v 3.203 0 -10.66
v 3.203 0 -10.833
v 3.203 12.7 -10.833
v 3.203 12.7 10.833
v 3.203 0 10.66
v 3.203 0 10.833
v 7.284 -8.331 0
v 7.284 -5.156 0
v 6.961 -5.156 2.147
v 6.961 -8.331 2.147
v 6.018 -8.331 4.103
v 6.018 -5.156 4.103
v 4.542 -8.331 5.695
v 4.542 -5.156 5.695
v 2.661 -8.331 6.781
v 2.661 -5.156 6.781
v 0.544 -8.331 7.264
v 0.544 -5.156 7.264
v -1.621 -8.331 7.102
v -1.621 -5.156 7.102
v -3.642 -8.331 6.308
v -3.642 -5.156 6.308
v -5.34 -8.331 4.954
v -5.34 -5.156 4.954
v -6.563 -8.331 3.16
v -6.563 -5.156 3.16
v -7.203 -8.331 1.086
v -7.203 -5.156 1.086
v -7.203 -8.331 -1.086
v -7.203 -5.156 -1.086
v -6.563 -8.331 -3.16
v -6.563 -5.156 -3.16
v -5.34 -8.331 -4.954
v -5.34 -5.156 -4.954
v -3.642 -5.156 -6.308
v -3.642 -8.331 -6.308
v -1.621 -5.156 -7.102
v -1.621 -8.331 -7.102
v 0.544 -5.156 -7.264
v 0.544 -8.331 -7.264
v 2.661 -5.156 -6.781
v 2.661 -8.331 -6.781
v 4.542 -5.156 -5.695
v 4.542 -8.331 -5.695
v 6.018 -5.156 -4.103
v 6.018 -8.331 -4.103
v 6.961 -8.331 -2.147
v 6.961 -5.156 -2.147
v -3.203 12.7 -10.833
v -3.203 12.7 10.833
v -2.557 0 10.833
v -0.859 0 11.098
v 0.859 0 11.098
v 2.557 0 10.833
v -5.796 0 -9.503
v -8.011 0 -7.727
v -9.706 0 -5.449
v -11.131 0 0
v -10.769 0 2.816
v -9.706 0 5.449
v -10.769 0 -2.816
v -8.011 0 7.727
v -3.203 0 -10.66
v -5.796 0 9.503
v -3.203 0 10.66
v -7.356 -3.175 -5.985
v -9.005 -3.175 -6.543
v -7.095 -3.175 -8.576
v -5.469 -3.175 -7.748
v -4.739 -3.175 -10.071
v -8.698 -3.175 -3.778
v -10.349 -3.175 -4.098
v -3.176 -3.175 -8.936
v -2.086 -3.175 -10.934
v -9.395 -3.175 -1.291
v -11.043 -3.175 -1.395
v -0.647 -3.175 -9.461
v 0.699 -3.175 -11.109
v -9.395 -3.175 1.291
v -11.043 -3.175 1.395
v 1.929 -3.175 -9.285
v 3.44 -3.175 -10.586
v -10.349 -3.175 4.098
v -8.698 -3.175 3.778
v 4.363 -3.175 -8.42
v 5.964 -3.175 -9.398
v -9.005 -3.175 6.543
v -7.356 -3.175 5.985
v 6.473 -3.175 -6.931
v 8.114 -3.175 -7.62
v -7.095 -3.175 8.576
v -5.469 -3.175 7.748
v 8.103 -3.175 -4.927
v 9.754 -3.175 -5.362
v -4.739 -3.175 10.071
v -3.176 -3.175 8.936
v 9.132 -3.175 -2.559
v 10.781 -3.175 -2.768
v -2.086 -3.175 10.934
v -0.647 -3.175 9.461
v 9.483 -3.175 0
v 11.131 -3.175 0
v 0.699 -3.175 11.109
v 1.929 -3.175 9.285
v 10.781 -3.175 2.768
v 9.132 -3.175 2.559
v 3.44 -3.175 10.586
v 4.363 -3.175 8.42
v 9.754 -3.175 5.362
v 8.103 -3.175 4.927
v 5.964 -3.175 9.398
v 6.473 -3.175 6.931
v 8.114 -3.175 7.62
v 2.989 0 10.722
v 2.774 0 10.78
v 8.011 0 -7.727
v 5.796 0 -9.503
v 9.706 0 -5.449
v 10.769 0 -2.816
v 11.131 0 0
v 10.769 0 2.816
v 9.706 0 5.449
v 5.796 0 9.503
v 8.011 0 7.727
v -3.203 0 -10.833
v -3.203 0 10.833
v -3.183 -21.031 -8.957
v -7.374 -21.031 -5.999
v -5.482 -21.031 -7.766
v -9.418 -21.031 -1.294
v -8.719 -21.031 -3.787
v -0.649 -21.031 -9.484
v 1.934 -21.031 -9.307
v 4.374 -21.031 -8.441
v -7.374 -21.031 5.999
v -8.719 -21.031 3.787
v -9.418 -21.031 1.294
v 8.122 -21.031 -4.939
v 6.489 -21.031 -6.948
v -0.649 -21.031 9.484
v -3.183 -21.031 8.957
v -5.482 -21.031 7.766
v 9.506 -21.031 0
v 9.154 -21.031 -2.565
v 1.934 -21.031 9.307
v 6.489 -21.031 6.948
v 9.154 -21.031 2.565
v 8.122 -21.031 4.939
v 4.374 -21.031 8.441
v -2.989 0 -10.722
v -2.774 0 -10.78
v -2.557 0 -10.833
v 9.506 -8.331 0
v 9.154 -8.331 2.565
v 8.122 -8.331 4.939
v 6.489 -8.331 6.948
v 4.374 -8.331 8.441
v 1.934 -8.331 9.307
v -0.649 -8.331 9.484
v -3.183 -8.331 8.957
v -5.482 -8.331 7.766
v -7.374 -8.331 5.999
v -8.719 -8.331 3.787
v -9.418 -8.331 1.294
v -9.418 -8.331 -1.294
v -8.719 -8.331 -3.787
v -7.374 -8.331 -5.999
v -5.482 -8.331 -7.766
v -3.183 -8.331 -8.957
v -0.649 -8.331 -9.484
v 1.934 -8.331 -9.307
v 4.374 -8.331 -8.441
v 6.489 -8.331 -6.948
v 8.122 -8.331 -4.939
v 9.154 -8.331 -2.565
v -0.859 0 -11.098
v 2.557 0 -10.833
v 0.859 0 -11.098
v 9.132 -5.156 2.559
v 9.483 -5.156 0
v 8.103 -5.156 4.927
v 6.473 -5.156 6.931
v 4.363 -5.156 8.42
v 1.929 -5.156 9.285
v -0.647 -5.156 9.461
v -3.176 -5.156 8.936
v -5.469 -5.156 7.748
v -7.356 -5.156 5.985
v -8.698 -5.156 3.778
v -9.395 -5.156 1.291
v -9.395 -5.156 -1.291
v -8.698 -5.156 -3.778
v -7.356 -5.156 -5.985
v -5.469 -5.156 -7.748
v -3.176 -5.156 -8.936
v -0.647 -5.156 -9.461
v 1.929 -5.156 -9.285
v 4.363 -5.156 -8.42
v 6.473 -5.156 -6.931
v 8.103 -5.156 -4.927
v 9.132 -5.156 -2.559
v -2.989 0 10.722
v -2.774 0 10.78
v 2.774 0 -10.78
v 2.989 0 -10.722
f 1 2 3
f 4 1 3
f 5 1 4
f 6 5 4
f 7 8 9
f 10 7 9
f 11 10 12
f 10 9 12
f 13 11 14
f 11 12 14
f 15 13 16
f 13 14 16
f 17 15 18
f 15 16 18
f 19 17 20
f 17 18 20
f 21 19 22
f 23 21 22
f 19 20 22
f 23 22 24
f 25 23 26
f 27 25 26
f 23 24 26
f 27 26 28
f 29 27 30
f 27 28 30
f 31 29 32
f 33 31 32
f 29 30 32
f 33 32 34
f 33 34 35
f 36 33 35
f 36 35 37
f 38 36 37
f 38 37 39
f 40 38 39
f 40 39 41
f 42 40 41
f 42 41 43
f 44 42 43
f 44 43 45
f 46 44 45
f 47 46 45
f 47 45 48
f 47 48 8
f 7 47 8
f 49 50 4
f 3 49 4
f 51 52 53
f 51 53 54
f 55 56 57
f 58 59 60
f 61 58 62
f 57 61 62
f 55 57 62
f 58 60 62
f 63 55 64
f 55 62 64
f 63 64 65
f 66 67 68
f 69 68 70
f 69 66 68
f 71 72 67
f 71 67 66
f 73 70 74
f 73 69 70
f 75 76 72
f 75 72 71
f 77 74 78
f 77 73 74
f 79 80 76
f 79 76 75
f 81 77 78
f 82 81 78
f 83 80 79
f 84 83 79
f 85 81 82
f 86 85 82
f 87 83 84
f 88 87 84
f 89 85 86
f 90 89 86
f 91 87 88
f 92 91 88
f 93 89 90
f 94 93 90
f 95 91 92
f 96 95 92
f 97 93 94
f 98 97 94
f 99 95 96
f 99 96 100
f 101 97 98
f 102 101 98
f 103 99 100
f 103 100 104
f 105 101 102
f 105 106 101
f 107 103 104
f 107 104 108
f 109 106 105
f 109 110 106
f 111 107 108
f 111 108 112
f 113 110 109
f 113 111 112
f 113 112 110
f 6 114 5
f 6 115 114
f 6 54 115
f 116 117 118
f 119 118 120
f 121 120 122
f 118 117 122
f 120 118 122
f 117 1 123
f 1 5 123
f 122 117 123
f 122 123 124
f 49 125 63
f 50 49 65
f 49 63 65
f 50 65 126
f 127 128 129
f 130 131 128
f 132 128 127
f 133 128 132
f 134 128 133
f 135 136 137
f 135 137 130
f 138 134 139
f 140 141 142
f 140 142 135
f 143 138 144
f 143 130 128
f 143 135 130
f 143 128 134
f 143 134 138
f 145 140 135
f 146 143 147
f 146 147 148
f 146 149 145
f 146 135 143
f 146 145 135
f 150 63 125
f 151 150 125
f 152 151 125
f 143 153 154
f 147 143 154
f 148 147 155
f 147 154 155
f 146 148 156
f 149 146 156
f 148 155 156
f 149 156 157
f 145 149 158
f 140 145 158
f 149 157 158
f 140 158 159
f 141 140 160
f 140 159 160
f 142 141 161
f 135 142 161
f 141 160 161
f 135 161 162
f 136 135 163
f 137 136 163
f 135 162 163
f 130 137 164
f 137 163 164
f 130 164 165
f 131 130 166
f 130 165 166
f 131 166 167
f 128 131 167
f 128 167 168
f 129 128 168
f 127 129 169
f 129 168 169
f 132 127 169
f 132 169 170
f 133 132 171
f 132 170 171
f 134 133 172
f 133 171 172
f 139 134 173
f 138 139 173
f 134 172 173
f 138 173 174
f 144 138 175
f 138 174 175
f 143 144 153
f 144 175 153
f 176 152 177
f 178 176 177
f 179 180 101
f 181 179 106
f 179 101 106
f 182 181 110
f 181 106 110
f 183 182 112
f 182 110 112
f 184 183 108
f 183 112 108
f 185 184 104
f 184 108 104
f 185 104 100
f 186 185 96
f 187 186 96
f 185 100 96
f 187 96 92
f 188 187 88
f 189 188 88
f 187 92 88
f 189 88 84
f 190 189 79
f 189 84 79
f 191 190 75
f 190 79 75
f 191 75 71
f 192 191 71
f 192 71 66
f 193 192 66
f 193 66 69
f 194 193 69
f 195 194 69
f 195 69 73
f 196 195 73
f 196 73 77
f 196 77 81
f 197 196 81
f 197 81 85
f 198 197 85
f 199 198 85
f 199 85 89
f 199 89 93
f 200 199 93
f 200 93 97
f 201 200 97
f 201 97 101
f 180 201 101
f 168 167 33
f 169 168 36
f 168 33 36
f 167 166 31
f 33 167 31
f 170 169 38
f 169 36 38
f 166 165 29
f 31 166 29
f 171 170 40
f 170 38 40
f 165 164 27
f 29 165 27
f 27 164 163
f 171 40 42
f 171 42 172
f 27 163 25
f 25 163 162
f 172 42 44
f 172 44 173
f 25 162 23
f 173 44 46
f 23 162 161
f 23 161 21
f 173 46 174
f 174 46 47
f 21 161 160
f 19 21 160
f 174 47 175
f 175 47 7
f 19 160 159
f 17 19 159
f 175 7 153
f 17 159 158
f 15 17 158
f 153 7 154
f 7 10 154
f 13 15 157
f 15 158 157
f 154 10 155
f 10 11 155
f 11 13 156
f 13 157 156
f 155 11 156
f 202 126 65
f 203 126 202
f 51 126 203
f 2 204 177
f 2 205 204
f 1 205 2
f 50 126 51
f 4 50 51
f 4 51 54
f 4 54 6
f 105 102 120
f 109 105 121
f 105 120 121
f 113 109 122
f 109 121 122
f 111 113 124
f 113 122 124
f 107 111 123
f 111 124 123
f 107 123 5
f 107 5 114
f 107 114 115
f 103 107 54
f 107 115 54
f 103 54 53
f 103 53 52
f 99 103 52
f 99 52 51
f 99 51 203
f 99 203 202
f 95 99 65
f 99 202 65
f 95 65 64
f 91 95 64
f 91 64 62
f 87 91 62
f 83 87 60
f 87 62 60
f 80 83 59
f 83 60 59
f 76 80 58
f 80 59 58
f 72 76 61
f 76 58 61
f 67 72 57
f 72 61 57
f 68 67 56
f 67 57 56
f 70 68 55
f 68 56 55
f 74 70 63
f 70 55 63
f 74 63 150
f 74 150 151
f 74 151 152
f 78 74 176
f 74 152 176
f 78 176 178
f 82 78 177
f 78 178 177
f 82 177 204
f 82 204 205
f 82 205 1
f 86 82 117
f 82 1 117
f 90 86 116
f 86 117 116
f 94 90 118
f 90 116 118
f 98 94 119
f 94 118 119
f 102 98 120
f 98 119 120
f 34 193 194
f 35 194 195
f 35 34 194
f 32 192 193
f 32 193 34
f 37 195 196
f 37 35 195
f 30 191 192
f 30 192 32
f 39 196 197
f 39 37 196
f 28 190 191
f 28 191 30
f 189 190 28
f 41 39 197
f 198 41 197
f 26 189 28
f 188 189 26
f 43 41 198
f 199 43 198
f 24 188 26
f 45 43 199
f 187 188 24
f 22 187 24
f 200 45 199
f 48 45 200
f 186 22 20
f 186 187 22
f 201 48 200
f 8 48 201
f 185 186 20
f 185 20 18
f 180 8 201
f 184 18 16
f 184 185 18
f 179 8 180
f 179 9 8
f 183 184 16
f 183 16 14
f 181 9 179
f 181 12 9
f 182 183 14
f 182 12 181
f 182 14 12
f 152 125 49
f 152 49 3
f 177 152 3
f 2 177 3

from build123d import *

# Parameters (mm, degrees)
F0_R     = 11.130797
F1_DEPTH = 3.175
F2_W     = 6.405964
F2_H     = 21.666086
F3_DEPTH = 12.7
F4_R     = 9.48328
F5_DEPTH = 5.1562
F6_R     = 7.284162
F7_DEPTH = 8.3312
F8_R     = 9.506324
F9_DEPTH = 12.7


with BuildPart() as f1:
    # F0 (on Front) → F1 (new body)
    with BuildSketch(Plane.XZ):
        Circle(F0_R)
    extrude(amount=F1_DEPTH)

    # F2 (on Front) → F3 (join)
    with BuildSketch(Plane.XZ):
        Rectangle(F2_W, F2_H)
    extrude(amount=-F3_DEPTH)

    # F4 (on Front) → F5 (join)
    with BuildSketch(Plane.XZ):
        Circle(F4_R)
    extrude(amount=F5_DEPTH)

    # F6 (on Front) → F7 (join)
    with BuildSketch(Plane.XZ):
        Circle(F6_R)
    extrude(amount=F7_DEPTH)

    # F8 (on face) → F9 (join)
    with BuildSketch(Plane.XZ.offset(8.3312)):
        Circle(F8_R)
    extrude(amount=F9_DEPTH)


solid = f1.part
